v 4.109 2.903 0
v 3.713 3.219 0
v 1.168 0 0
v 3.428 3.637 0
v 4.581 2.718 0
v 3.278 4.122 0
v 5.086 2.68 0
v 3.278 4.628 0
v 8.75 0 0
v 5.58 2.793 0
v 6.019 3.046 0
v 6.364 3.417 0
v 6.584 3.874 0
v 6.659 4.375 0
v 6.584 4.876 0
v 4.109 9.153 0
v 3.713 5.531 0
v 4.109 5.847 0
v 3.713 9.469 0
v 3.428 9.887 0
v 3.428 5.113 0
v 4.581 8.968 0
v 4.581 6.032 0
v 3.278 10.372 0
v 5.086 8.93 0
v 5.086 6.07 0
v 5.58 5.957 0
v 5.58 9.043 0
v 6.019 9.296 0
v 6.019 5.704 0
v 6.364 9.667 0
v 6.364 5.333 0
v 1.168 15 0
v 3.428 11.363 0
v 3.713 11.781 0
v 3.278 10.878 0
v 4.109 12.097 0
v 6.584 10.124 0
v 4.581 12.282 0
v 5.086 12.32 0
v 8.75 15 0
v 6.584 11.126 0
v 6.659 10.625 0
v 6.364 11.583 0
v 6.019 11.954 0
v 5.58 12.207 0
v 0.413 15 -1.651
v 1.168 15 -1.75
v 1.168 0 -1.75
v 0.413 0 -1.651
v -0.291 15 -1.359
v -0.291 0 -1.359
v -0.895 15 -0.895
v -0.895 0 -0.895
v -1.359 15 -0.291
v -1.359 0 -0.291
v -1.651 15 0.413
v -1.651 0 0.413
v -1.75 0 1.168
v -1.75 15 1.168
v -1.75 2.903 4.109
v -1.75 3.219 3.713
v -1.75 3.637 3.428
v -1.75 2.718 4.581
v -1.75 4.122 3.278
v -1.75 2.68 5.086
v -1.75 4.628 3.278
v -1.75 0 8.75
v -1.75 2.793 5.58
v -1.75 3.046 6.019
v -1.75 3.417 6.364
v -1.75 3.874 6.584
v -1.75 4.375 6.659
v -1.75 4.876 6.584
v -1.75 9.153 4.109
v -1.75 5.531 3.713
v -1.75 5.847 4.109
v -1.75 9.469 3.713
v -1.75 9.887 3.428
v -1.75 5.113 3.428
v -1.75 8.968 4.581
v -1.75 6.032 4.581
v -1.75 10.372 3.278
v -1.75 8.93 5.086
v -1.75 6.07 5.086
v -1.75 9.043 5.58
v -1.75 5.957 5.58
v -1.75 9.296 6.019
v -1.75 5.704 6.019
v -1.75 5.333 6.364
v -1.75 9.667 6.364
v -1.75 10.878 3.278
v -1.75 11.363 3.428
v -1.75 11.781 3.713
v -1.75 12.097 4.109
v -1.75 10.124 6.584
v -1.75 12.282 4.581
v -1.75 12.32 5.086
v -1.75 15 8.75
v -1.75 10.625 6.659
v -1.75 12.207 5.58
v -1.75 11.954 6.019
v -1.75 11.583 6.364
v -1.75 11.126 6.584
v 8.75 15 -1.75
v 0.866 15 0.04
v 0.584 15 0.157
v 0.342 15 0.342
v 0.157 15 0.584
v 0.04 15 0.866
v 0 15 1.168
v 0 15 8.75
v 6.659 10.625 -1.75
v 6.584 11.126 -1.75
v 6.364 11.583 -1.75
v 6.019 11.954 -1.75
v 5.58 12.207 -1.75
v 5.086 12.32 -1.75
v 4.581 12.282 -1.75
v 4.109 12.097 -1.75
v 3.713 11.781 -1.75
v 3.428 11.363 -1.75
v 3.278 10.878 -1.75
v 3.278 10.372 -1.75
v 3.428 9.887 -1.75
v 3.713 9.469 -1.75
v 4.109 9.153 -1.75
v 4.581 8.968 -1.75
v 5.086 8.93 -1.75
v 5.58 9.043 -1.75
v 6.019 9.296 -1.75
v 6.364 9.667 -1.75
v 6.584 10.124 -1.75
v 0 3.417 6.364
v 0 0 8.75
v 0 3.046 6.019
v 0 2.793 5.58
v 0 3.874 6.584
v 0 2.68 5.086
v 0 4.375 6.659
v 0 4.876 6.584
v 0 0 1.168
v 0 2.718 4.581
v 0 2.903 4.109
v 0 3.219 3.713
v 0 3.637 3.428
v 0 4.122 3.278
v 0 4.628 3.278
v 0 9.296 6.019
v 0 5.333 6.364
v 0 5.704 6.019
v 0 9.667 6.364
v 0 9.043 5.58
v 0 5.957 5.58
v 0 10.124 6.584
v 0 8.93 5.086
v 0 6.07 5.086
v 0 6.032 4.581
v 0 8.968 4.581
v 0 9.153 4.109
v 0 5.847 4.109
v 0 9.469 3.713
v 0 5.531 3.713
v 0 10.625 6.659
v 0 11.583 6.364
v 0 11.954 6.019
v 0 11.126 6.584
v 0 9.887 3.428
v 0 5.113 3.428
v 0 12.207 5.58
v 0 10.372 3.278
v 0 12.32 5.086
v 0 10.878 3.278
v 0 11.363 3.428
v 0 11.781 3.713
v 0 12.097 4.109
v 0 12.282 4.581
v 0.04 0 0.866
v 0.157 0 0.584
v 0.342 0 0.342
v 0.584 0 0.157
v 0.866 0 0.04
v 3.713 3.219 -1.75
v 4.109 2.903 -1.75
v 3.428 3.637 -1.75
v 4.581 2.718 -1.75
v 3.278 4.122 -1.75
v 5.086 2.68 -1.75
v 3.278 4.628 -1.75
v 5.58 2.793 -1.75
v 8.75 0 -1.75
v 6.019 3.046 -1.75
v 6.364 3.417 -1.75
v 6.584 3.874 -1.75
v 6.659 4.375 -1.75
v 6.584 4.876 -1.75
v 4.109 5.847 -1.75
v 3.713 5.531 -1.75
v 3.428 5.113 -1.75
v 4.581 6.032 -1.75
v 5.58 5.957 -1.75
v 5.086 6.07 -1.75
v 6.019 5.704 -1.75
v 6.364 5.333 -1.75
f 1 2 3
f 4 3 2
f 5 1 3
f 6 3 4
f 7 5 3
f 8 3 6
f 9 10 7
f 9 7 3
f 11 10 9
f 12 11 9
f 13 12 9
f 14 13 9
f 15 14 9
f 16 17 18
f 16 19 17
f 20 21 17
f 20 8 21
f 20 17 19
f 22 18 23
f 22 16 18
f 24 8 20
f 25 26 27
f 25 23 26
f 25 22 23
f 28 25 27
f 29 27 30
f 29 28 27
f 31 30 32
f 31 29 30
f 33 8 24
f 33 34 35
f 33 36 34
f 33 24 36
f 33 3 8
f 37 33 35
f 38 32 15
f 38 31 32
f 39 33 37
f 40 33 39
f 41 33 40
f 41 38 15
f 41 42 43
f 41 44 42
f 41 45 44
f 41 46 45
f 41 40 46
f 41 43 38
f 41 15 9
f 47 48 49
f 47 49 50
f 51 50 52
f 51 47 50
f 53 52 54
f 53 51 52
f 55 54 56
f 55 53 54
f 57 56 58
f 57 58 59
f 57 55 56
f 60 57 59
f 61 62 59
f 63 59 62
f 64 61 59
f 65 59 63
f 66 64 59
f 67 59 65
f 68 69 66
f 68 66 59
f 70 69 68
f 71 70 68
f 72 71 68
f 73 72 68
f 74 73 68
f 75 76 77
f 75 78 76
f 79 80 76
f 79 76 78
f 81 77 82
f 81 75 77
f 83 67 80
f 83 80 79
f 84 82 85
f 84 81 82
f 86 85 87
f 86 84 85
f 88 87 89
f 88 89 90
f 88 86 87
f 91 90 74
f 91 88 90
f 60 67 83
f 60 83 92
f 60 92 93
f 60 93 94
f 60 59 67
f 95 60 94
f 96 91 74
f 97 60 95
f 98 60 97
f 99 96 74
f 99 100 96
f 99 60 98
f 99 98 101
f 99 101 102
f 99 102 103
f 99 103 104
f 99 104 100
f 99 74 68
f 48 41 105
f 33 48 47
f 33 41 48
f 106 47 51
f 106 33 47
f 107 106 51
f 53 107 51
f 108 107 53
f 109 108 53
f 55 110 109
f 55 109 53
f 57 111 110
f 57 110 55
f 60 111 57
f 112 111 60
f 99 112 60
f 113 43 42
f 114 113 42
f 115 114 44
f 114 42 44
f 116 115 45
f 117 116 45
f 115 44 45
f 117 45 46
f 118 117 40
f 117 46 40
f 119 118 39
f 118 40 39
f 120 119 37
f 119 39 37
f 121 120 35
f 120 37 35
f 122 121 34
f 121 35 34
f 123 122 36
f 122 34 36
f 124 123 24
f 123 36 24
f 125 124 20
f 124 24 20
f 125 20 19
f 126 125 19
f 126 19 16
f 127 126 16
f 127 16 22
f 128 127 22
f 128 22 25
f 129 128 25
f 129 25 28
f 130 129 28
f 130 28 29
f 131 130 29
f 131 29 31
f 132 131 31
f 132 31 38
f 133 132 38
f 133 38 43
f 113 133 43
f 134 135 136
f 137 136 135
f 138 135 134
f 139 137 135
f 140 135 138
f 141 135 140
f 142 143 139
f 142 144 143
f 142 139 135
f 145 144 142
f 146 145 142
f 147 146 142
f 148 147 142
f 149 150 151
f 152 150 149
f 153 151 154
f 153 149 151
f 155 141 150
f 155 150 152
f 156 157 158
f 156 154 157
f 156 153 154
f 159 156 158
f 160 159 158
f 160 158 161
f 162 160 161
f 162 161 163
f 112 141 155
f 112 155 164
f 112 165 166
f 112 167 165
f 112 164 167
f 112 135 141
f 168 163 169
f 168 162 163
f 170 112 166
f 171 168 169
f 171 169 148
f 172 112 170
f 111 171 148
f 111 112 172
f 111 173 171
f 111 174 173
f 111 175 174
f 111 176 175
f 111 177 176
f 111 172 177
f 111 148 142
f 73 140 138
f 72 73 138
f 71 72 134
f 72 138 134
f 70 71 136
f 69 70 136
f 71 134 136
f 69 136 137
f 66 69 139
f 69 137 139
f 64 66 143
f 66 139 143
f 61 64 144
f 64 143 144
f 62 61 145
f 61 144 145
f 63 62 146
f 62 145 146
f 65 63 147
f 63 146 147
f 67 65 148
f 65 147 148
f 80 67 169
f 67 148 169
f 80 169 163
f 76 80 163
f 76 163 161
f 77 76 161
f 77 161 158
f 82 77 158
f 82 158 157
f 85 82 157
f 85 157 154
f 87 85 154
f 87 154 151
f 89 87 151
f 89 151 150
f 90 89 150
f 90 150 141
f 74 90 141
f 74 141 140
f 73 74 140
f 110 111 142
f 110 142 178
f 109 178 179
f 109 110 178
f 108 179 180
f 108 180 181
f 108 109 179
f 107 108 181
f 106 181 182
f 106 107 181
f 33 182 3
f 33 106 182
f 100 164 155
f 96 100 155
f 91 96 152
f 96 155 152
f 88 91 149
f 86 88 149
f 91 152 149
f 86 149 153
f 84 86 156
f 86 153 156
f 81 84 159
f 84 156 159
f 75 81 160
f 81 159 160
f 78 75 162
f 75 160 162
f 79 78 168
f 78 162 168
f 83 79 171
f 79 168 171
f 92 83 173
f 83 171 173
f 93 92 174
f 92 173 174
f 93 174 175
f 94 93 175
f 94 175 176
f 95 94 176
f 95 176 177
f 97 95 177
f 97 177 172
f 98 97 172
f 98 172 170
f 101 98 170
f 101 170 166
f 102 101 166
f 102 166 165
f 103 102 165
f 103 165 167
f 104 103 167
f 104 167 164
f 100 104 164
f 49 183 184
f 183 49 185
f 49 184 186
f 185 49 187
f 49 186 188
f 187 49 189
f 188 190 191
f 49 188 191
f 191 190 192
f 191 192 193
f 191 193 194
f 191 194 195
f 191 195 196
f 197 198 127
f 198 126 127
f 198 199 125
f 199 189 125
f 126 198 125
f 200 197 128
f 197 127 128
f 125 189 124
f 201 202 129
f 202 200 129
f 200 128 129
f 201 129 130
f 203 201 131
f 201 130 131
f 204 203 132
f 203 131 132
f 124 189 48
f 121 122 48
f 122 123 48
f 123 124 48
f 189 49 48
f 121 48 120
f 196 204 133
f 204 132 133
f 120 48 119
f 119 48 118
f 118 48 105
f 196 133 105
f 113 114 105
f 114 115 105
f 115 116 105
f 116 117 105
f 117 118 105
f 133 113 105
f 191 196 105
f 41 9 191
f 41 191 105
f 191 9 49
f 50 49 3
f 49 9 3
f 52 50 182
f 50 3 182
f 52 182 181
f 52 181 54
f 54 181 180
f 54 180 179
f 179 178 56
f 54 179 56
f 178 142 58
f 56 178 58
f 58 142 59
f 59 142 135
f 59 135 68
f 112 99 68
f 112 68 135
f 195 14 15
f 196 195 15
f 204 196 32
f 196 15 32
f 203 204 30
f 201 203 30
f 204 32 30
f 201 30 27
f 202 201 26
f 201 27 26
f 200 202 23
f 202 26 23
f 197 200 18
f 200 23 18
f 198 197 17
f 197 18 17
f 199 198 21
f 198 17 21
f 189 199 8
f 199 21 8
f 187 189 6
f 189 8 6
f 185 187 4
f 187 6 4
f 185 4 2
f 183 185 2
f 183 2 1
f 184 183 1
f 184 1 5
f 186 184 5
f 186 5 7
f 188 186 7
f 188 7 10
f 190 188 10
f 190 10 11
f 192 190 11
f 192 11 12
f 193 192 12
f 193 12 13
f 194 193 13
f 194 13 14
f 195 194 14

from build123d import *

# Parameters (mm, degrees)
SKETCH1_W                      = 8.75
SKETCH1_H                      = 15
BASE_FLANGE1_DEPTH             = 1.75
EDGE_FLANGE1_STRIP_W           = 9.3368
EDGE_FLANGE1_STRIP_H           = 1.75
EDGE_FLANGE1_STRIP_CUT_DEPTH   = 15
EDGE_FLANGE1_DEPTH             = 15
M3_CLEARANCE_HOLE1_D           = 3.4
M3_CLEARANCE_HOLE1_ON_FACE_2_D = 3.4


# Sheet-metal steps are written as plain solids
with BuildPart() as part:
    # Sketch1 → Base-Flange1 (new body)
    with BuildSketch(Plane.XY):
        with Locations((4.375, 7.5)):
            Rectangle(SKETCH1_W, SKETCH1_H)
    extrude(amount=-BASE_FLANGE1_DEPTH)

    # Edge-Flange1 strip (across the edge) → Edge-Flange1 strip cut (cut)
    with BuildSketch(Plane.XZ.offset(-15)):
        with Locations((-3.5, -0.875)):
            Rectangle(EDGE_FLANGE1_STRIP_W, EDGE_FLANGE1_STRIP_H)
    extrude(amount=EDGE_FLANGE1_STRIP_CUT_DEPTH, mode=Mode.SUBTRACT)

    # Edge-Flange1 section (across the edge) → Edge-Flange1 (add)
    with BuildSketch(Plane.XZ.offset(-15)):
        with BuildLine():
            Line((-1.75, 1.1684), (-1.75, 8.75))
            Line((-1.75, 8.75), (0, 8.75))
            Line((0, 8.75), (0, 1.1684))
            ThreePointArc((0, 1.1684), (0.342216437, 0.342216437), (1.1684, 0))
            Line((1.1684, 0), (1.1684, -1.75))
            ThreePointArc((1.1684, -1.75), (-0.89522043, -0.89522043), (-1.75, 1.1684))
        make_face()
    extrude(amount=EDGE_FLANGE1_DEPTH)

    # M3 Clearance Hole1 (through all)
    with Locations(Plane(origin=(-1.75, 10.625, 4.9592), x_dir=(0, 0, -1), z_dir=(-1, 0, 0))):
        with Locations((0, 0), (0, 6.25)):
            Hole(M3_CLEARANCE_HOLE1_D / 2)

    # M3 Clearance Hole1 on face 2 (through all)
    with Locations(Plane(origin=(4.9592, 10.625, -1.75), x_dir=(-1, 0, 0), z_dir=(0, 0, -1))):
        with Locations((0, 0), (0, -6.25)):
            Hole(M3_CLEARANCE_HOLE1_ON_FACE_2_D / 2)


solid = part.part
